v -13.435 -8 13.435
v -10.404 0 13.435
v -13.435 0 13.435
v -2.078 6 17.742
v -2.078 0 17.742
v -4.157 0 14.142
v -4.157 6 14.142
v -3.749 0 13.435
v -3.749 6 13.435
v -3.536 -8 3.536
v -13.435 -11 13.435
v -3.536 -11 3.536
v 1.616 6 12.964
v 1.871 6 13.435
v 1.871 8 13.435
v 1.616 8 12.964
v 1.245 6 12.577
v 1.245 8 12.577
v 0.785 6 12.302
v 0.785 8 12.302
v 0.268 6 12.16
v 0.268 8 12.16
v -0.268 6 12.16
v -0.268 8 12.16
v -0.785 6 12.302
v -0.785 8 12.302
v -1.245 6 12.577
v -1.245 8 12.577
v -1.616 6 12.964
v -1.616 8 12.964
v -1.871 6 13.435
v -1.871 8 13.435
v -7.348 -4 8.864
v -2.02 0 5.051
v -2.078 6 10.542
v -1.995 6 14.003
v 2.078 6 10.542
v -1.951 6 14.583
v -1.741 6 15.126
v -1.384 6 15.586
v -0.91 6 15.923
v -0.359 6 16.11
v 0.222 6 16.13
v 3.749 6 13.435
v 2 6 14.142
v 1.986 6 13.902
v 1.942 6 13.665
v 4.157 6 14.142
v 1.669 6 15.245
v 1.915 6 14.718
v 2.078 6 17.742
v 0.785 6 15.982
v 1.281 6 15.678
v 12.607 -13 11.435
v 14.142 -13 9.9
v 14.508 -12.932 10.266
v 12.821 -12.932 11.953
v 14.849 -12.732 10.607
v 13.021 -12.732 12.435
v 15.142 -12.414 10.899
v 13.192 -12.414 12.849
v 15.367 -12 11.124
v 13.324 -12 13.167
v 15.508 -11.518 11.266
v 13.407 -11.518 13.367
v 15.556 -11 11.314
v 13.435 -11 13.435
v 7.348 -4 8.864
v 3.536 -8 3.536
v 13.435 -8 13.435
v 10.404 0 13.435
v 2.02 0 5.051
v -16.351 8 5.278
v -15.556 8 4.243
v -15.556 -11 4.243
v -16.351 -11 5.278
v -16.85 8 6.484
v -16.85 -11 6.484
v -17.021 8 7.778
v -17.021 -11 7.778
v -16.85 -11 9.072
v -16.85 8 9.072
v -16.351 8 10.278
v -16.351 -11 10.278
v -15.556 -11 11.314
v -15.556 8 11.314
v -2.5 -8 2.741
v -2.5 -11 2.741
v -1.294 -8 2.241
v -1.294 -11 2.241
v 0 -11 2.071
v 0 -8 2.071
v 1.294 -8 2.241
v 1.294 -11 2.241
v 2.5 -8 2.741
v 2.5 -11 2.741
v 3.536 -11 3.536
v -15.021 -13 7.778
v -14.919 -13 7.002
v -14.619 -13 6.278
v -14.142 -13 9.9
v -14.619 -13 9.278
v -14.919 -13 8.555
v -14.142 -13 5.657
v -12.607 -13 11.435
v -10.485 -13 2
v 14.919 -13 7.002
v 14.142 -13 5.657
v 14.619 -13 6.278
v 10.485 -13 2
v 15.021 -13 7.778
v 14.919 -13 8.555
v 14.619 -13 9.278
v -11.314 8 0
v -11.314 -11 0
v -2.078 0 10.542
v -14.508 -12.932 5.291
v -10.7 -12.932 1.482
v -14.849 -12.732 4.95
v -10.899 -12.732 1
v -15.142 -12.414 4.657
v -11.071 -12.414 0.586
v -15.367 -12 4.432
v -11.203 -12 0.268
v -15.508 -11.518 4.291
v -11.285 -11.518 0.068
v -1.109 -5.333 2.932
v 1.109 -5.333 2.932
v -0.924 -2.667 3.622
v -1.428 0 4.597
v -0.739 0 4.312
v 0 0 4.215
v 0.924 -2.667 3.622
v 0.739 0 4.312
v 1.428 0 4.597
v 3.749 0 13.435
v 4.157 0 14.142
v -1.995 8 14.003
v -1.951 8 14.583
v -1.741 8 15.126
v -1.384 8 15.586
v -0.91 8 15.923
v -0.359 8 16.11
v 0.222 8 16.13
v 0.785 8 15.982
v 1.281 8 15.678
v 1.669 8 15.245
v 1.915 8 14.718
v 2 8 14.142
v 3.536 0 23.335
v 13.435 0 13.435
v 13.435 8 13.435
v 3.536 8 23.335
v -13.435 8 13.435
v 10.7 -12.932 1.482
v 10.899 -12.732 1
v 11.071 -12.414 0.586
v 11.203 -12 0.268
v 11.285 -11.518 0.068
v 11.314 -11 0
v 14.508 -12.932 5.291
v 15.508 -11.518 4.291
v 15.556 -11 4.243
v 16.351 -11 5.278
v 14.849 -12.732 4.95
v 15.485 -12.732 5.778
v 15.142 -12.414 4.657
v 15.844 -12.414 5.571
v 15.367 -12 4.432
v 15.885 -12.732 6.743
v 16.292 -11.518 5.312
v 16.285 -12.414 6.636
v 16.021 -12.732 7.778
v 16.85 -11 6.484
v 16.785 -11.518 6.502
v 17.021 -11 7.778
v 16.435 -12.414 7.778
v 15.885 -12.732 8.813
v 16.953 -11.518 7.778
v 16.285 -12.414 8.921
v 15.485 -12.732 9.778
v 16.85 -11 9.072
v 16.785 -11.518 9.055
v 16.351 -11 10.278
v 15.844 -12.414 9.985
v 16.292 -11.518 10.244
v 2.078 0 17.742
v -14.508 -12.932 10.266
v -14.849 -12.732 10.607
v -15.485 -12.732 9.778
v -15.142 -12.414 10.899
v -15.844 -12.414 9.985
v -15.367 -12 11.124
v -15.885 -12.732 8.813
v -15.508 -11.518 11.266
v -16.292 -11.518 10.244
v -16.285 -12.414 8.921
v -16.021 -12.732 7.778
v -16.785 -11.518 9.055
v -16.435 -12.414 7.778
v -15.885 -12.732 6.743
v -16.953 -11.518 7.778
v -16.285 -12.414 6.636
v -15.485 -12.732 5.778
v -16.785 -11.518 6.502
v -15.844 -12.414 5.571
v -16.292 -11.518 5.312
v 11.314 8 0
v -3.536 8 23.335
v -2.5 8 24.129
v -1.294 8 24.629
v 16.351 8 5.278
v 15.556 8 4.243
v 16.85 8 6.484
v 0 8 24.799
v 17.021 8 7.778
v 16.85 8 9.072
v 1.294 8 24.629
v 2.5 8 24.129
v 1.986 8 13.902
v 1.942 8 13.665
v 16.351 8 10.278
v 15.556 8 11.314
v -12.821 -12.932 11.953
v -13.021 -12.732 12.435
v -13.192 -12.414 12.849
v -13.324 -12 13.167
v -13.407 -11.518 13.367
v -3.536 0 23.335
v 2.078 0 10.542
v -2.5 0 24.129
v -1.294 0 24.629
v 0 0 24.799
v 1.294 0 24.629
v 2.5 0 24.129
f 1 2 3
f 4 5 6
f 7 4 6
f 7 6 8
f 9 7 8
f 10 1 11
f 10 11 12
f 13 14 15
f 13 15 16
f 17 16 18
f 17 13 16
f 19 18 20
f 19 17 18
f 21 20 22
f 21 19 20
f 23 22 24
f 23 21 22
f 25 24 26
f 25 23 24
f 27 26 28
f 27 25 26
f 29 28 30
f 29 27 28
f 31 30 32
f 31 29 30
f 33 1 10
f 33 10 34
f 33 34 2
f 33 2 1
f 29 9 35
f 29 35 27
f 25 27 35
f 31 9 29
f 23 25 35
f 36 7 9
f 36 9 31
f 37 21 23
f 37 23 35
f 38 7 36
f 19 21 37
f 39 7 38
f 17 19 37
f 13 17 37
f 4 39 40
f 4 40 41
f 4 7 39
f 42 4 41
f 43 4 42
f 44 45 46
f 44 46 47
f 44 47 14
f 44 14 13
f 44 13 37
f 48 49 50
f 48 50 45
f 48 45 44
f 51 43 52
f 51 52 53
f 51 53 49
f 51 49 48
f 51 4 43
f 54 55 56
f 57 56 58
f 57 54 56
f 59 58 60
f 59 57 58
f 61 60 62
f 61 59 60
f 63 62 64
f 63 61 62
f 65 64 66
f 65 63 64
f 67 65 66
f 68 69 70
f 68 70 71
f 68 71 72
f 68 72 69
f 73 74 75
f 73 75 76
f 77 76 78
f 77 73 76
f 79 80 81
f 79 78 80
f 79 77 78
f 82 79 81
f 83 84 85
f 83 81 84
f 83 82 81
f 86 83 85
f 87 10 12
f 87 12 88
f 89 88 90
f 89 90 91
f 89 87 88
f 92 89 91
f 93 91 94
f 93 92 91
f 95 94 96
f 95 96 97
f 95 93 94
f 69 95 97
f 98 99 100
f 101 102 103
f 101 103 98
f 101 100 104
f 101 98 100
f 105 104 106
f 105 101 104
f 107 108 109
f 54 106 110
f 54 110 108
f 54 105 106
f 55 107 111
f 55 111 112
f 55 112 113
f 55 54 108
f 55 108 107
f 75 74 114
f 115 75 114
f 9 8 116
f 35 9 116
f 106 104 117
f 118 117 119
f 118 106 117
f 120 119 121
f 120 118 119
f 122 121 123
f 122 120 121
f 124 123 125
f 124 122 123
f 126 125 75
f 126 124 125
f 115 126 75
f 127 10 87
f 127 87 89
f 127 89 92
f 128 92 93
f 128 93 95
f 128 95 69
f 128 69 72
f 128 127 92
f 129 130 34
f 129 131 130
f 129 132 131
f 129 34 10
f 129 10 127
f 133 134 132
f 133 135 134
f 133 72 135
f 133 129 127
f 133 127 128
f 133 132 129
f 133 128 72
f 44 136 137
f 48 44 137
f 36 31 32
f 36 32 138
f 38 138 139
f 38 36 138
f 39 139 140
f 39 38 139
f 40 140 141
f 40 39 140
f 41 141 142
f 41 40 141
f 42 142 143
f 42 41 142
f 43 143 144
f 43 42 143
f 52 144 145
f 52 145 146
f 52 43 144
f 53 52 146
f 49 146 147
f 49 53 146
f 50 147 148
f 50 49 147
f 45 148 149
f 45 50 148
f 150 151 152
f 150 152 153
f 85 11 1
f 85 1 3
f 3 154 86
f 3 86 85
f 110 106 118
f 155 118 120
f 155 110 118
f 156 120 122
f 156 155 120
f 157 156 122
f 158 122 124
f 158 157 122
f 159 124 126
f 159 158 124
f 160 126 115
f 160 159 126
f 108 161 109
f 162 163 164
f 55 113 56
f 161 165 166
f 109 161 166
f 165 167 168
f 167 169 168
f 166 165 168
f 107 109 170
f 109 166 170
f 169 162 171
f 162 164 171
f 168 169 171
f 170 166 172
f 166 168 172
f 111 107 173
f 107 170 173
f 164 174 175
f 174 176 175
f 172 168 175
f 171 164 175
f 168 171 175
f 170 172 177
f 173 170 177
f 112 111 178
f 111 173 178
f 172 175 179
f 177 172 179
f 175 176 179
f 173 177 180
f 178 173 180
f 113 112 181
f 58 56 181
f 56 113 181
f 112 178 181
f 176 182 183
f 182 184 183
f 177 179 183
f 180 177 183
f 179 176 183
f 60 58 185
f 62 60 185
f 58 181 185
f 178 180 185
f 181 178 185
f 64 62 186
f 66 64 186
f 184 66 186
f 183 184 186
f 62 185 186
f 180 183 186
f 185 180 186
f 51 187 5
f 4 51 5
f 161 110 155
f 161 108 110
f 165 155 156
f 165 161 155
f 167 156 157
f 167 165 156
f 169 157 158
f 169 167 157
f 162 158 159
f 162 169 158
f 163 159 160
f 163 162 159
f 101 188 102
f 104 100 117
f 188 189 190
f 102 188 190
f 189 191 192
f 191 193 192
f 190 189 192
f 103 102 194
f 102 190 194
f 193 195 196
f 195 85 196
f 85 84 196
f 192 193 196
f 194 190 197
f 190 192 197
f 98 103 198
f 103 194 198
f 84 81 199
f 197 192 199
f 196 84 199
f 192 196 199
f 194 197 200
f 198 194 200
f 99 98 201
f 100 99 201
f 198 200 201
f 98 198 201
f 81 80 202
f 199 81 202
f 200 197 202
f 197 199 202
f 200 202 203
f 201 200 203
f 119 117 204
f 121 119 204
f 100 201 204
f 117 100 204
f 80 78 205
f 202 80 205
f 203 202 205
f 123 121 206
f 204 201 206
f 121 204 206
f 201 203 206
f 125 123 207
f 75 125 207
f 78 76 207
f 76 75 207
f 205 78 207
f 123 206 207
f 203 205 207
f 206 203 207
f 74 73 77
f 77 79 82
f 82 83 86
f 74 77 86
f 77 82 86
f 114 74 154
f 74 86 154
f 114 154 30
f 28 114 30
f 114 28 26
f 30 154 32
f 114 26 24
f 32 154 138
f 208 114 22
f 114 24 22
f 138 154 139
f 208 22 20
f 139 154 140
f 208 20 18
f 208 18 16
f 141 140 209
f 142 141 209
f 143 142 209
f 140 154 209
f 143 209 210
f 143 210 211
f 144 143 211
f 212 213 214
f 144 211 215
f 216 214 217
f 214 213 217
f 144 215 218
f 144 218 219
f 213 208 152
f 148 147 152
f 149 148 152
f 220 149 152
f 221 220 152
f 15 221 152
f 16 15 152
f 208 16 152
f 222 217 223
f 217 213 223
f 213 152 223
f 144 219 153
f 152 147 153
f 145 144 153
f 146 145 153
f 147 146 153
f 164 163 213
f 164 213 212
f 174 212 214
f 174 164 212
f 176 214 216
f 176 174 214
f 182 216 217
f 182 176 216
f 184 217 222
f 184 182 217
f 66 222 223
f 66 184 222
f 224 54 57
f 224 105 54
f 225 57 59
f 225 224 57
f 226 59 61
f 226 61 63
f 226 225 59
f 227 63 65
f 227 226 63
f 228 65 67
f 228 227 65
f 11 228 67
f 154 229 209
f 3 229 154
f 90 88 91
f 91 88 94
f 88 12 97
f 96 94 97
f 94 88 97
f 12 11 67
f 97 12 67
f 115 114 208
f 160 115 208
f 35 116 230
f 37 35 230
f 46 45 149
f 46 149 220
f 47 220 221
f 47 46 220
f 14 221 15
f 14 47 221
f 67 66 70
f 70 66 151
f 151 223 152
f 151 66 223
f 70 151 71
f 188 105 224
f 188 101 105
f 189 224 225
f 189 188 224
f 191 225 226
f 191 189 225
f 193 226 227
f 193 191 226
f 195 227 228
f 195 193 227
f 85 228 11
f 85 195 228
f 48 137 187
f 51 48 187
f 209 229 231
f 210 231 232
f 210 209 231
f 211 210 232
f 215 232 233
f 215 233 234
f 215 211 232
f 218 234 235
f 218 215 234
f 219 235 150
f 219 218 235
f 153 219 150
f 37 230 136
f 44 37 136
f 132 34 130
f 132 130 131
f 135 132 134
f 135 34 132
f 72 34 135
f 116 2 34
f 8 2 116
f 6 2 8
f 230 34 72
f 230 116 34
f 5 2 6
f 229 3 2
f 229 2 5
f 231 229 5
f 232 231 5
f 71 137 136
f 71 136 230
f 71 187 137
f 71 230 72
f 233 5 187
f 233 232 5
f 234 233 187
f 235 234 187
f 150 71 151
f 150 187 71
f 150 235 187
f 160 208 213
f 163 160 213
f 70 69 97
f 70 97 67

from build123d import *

# Parameters (mm, degrees)
F1_DEPTH = 8
F2_DEPTH = 6
F3_DEPTH = 13
F6_DEPTH = 8
F6_TAPER = 15
F7_DEPTH = 3
F8_R     = 5
F9_R     = 1.99999


# Not quite as in the source:
# - a fillet or chamfer is up to 0.001 mm smaller than in the source, because OpenCascade refuses the exact size


with BuildPart() as f1:
    # F0 (on Front) → F1 (new body)
    with BuildSketch(Plane.XZ):
        Polygon((-13.4350288425, 13.4350288425), (0, 0), (13.4350288425, 13.4350288425), (3.7486736477, 13.4350288425), (2.0784609691, 10.5421356237), (-2.0784609691, 10.5421356237), (-3.7486736477, 13.4350288425), align=None)
        Polygon((3.7486736477, 13.4350288425), (13.4350288425, 13.4350288425), (0, 26.8700576851), (-13.4350288425, 13.4350288425), (-3.7486736477, 13.4350288425), (-4.1569219382, 14.1421356237), (-2.0784609691, 17.7421356237), (2.0784609691, 17.7421356237), (4.1569219382, 14.1421356237), align=None)
        Polygon((-11.313708499, 0), (0, 0), (-13.4350288425, 13.4350288425), (-19.091883092, 7.7781745931), align=None)
        Polygon((13.4350288425, 13.4350288425), (0, 0), (11.313708499, 0), (19.091883092, 7.7781745931), align=None)
        with BuildLine():
            Line((1.8708286934, 13.4350288425), (3.7486736477, 13.4350288425))
            Line((3.7486736477, 13.4350288425), (4.1569219382, 14.1421356237))
            Line((4.1569219382, 14.1421356237), (2.0784609691, 17.7421356237))
            Line((2.0784609691, 17.7421356237), (-2.0784609691, 17.7421356237))
            Line((-2.0784609691, 17.7421356237), (-4.1569219382, 14.1421356237))
            Line((-4.1569219382, 14.1421356237), (-3.7486736477, 13.4350288425))
            Line((-3.7486736477, 13.4350288425), (-1.8708286934, 13.4350288425))
            ThreePointArc((-1.8708286934, 13.4350288425), (-0.3594040993, 16.109577794), (2, 14.1421356237))
            ThreePointArc((2, 14.1421356237), (1.9674421703, 13.7827315244), (1.8708286934, 13.4350288425))
        make_face()
        with BuildLine():
            Line((2.0784609691, 10.5421356237), (3.7486736477, 13.4350288425))
            Line((3.7486736477, 13.4350288425), (1.8708286934, 13.4350288425))
            ThreePointArc((1.8708286934, 13.4350288425), (0, 12.1421356237), (-1.8708286934, 13.4350288425))
            Line((-1.8708286934, 13.4350288425), (-3.7486736477, 13.4350288425))
            Line((-3.7486736477, 13.4350288425), (-2.0784609691, 10.5421356237))
            Line((-2.0784609691, 10.5421356237), (2.0784609691, 10.5421356237))
        make_face()
    extrude(amount=-F1_DEPTH)

    # F0 (on Front) → F2 (cut)
    with BuildSketch(Plane.XZ):
        with BuildLine():
            Line((1.8708286934, 13.4350288425), (3.7486736477, 13.4350288425))
            Line((3.7486736477, 13.4350288425), (4.1569219382, 14.1421356237))
            Line((4.1569219382, 14.1421356237), (2.0784609691, 17.7421356237))
            Line((2.0784609691, 17.7421356237), (-2.0784609691, 17.7421356237))
            Line((-2.0784609691, 17.7421356237), (-4.1569219382, 14.1421356237))
            Line((-4.1569219382, 14.1421356237), (-3.7486736477, 13.4350288425))
            Line((-3.7486736477, 13.4350288425), (-1.8708286934, 13.4350288425))
            ThreePointArc((-1.8708286934, 13.4350288425), (-0.3594040993, 16.109577794), (2, 14.1421356237))
            ThreePointArc((2, 14.1421356237), (1.9674421703, 13.7827315244), (1.8708286934, 13.4350288425))
        make_face()
        with BuildLine():
            Line((2.0784609691, 10.5421356237), (3.7486736477, 13.4350288425))
            Line((3.7486736477, 13.4350288425), (1.8708286934, 13.4350288425))
            ThreePointArc((1.8708286934, 13.4350288425), (0, 12.1421356237), (-1.8708286934, 13.4350288425))
            Line((-1.8708286934, 13.4350288425), (-3.7486736477, 13.4350288425))
            Line((-3.7486736477, 13.4350288425), (-2.0784609691, 10.5421356237))
            Line((-2.0784609691, 10.5421356237), (2.0784609691, 10.5421356237))
        make_face()
    extrude(amount=-F2_DEPTH, mode=Mode.SUBTRACT)

    # F0 (on Front) → F3 (join)
    with BuildSketch(Plane.XZ):
        Polygon((-11.313708499, 0), (0, 0), (-13.4350288425, 13.4350288425), (-19.091883092, 7.7781745931), align=None)
        Polygon((-13.4350288425, 13.4350288425), (0, 0), (13.4350288425, 13.4350288425), (3.7486736477, 13.4350288425), (2.0784609691, 10.5421356237), (-2.0784609691, 10.5421356237), (-3.7486736477, 13.4350288425), align=None)
        Polygon((13.4350288425, 13.4350288425), (0, 0), (11.313708499, 0), (19.091883092, 7.7781745931), align=None)
        with BuildLine():
            ThreePointArc((-1.8708286934, 13.4350288425), (0, 12.1421356237), (1.8708286934, 13.4350288425))
            Line((1.8708286934, 13.4350288425), (0, 13.4350288425))
            Line((0, 13.4350288425), (-1.8708286934, 13.4350288425))
        make_face()
        with BuildLine():
            Line((2.0784609691, 10.5421356237), (3.7486736477, 13.4350288425))
            Line((3.7486736477, 13.4350288425), (1.8708286934, 13.4350288425))
            ThreePointArc((1.8708286934, 13.4350288425), (0, 12.1421356237), (-1.8708286934, 13.4350288425))
            Line((-1.8708286934, 13.4350288425), (-3.7486736477, 13.4350288425))
            Line((-3.7486736477, 13.4350288425), (-2.0784609691, 10.5421356237))
            Line((-2.0784609691, 10.5421356237), (2.0784609691, 10.5421356237))
        make_face()
    extrude(amount=F3_DEPTH)

    # F5 (on offset) → F6 (cut)
    with BuildSketch(Plane.XZ.offset(8)):
        with BuildLine():
            Line((0, 26.8700576851), (-13.4350288425, 13.4350288425))
            Line((-13.4350288425, 13.4350288425), (-3.5355339059, 3.5355339059))
            ThreePointArc((-3.5355339059, 3.5355339059), (0, 2.0710678119), (3.5355339059, 3.5355339059))
            Line((3.5355339059, 3.5355339059), (13.4350288425, 13.4350288425))
            Line((13.4350288425, 13.4350288425), (0, 26.8700576851))
        make_face()
    extrude(amount=-F6_DEPTH, taper=F6_TAPER, mode=Mode.SUBTRACT)

    # F5 (on offset) → F7 (cut)
    with BuildSketch(Plane.XZ.offset(8)):
        with BuildLine():
            Line((0, 26.8700576851), (-13.4350288425, 13.4350288425))
            Line((-13.4350288425, 13.4350288425), (-3.5355339059, 3.5355339059))
            ThreePointArc((-3.5355339059, 3.5355339059), (0, 2.0710678119), (3.5355339059, 3.5355339059))
            Line((3.5355339059, 3.5355339059), (13.4350288425, 13.4350288425))
            Line((13.4350288425, 13.4350288425), (0, 26.8700576851))
        make_face()
    extrude(amount=F7_DEPTH, mode=Mode.SUBTRACT)

    # F8
    f8_edges = [f1.edges().sort_by_distance(p)[0] for p in [
        (-19.091883, -2.5, 7.778175),
        (0, 4, 26.870058),
        (19.091883, -2.5, 7.778175),
    ]]
    fillet(f8_edges, radius=F8_R)

    # F9 (radius 2 in the source; OpenCascade refuses exactly that, so slightly less here)
    f9_edges = [f1.edges().sort_by_distance(p)[0] for p in [
        (-14.495689, -13, 12.374369),
        (-17.020815, -13, 7.778175),
        (0, -13, 13.435029),
        (-13.435029, -13, 2.12132),
        (14.495689, -13, 12.374369),
        (0, -13, 0),
        (17.020815, -13, 7.778175),
        (13.435029, -13, 2.12132),
    ]]
    fillet(f9_edges, radius=F9_R)


solid = f1.part
